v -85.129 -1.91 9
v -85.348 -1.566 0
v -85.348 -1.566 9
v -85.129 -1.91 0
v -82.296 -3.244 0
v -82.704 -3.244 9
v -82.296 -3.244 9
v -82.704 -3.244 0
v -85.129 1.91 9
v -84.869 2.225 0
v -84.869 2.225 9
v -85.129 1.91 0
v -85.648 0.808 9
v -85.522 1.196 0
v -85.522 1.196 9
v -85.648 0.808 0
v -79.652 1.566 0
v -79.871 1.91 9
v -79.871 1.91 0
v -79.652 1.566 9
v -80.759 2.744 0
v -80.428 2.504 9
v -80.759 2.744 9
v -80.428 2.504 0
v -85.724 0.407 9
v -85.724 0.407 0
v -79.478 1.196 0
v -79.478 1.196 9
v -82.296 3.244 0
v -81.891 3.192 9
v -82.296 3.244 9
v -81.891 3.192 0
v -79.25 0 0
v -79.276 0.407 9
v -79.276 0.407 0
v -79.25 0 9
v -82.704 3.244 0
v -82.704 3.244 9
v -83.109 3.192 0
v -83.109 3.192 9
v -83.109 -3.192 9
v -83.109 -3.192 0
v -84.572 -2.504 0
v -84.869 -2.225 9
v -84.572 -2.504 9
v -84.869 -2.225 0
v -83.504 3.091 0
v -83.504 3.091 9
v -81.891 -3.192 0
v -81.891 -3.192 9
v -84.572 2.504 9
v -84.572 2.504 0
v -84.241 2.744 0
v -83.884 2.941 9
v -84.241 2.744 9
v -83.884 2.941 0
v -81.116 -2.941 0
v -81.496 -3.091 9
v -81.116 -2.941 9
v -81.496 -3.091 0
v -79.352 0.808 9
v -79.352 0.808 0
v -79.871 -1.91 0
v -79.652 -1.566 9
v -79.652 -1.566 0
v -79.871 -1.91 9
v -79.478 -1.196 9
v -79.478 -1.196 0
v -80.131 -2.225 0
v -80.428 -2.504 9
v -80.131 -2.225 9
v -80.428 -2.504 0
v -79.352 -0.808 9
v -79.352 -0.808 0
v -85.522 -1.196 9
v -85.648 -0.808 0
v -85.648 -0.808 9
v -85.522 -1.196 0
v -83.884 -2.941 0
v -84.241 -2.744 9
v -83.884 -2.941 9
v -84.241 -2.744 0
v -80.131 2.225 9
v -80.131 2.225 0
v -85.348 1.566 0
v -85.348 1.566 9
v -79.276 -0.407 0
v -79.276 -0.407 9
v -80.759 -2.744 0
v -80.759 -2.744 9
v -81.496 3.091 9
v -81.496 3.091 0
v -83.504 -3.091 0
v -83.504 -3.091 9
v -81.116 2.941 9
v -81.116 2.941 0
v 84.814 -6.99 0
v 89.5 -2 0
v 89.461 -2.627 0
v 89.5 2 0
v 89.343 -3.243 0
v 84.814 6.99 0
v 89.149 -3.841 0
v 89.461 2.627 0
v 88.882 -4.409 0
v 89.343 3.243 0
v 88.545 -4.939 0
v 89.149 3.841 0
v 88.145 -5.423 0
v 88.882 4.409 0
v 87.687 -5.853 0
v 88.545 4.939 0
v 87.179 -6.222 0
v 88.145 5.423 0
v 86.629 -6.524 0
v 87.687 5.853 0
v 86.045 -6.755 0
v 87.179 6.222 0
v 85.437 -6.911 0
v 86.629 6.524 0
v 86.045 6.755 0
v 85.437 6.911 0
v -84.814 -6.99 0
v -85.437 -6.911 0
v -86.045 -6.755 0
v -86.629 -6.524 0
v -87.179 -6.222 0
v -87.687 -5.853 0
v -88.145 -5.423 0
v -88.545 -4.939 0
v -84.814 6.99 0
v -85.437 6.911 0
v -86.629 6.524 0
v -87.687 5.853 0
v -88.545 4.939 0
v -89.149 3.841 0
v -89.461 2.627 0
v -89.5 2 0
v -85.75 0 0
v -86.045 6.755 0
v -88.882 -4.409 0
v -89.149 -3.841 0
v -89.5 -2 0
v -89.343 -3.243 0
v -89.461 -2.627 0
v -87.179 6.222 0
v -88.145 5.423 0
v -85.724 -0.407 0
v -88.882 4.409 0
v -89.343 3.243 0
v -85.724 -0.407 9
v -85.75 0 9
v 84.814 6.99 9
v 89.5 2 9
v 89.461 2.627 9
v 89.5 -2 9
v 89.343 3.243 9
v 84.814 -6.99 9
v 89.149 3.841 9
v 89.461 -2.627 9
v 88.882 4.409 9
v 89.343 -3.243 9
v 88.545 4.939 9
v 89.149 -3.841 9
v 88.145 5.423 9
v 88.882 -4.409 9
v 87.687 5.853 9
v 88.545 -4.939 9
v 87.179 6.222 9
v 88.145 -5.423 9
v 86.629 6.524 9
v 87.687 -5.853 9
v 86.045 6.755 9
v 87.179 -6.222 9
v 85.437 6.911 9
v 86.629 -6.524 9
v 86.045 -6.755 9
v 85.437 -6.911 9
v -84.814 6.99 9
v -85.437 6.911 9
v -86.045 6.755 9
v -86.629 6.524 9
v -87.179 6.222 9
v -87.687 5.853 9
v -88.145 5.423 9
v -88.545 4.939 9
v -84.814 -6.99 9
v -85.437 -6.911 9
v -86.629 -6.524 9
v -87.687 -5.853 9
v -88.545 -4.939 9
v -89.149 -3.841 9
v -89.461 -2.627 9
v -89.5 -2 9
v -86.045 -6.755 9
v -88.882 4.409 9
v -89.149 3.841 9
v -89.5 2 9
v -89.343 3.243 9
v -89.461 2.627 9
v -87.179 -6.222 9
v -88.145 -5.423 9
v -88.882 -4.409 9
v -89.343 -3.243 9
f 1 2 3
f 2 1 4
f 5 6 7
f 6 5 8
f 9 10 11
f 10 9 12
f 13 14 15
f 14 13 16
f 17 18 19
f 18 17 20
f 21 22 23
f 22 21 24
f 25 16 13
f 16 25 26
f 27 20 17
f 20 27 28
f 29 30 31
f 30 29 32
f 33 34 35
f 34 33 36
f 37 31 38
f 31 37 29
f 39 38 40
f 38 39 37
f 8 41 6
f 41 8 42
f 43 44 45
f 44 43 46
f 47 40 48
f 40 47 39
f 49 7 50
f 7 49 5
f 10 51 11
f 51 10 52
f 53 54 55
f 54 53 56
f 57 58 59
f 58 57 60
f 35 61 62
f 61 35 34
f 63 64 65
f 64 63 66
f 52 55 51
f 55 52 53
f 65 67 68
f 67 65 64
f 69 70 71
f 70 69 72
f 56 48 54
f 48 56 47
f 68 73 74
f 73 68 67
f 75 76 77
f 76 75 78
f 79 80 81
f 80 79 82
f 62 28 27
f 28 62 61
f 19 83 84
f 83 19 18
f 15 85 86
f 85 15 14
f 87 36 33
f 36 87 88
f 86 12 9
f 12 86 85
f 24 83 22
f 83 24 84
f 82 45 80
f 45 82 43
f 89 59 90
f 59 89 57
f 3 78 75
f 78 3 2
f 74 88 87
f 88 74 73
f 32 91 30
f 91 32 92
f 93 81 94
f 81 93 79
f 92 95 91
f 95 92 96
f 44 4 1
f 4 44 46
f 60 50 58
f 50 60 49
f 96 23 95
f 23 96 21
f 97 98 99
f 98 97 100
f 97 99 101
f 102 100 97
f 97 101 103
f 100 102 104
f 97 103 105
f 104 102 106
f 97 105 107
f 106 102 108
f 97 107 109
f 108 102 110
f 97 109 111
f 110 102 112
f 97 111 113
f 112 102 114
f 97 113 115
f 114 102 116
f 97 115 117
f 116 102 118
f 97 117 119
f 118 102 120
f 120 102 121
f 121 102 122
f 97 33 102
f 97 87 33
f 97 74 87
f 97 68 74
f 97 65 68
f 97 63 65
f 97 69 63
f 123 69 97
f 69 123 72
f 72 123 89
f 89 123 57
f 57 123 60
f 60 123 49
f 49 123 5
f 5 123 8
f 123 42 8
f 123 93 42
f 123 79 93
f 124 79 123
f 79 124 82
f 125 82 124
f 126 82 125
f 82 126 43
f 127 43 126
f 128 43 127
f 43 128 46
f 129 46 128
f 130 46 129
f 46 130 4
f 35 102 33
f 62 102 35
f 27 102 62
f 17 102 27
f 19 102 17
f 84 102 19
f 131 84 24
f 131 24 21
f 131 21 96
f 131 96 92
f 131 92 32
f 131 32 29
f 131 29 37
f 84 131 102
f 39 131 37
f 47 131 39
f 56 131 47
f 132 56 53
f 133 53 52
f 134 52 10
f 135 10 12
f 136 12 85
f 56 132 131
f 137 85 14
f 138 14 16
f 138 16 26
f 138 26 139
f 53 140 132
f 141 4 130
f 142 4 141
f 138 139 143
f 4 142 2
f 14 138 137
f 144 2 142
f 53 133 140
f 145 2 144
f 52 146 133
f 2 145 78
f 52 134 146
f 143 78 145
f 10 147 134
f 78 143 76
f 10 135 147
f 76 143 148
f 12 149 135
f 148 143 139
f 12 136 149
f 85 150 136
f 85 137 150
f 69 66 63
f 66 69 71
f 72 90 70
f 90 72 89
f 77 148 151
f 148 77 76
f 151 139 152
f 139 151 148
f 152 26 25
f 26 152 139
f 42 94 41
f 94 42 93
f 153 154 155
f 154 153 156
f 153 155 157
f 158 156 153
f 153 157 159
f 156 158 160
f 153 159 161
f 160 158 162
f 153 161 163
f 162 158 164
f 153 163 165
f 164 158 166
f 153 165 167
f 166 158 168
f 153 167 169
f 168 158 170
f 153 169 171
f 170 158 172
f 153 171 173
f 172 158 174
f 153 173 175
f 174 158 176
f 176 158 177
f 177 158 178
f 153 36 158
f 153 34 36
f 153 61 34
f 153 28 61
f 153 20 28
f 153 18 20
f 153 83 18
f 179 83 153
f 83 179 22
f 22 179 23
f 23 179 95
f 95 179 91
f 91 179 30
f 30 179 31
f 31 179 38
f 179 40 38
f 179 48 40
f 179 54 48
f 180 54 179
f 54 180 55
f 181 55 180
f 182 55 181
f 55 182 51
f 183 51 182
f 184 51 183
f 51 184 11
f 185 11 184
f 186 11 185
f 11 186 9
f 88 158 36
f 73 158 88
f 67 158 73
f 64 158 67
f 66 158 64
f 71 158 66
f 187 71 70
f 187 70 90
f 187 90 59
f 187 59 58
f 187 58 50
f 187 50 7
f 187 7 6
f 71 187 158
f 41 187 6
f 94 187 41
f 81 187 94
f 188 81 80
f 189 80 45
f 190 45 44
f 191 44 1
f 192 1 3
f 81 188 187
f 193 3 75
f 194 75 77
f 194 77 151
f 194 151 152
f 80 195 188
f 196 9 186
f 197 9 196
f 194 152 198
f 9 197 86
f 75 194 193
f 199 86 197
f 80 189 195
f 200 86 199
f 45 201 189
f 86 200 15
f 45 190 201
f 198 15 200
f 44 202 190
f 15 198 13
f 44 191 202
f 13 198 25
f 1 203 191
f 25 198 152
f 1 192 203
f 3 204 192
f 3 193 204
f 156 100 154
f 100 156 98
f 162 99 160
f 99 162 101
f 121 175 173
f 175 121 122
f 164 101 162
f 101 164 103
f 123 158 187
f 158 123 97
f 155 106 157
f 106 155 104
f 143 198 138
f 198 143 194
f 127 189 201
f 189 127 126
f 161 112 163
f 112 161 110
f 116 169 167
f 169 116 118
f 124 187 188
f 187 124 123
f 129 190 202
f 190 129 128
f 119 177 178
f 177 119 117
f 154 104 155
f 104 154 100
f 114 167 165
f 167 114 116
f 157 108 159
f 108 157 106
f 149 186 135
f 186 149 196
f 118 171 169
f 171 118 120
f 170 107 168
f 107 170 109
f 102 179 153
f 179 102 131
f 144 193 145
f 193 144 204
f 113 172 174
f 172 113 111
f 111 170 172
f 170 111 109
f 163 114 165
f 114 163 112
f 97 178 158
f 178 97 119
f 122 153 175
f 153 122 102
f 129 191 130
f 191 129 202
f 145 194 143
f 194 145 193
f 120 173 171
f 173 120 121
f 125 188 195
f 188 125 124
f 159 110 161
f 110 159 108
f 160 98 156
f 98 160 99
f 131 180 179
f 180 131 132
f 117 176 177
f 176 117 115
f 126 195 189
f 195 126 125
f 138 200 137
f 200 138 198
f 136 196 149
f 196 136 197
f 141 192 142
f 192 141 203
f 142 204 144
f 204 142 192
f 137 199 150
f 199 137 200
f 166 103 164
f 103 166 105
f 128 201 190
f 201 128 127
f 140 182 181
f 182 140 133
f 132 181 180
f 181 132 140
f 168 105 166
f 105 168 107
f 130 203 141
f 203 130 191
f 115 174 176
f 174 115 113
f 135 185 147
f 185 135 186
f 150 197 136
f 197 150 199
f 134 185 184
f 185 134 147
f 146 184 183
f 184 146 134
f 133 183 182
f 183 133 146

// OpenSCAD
$fn = 50;


difference() {
	union() {
		hull() {
			translate(v = [-84.5000000000, 2.0000000000, 0]) {
				cylinder(h = 9, r = 5);
			}
			translate(v = [84.5000000000, 2.0000000000, 0]) {
				cylinder(h = 9, r = 5);
			}
			translate(v = [-84.5000000000, -2.0000000000, 0]) {
				cylinder(h = 9, r = 5);
			}
			translate(v = [84.5000000000, -2.0000000000, 0]) {
				cylinder(h = 9, r = 5);
			}
		}
	}
	union() {
		translate(v = [-82.5000000000, 0.0000000000, 0]) {
			cylinder(h = 9, r = 3.2500000000);
		}
		translate(v = [-82.5000000000, 0.0000000000, 0]) {
			cylinder(h = 9, r = 1.8000000000);
		}
		translate(v = [-82.5000000000, 0.0000000000, 0]) {
			cylinder(h = 9, r = 1.8000000000);
		}
		translate(v = [-82.5000000000, 0.0000000000, 0]) {
			cylinder(h = 9, r = 1.8000000000);
		}
	}
}
